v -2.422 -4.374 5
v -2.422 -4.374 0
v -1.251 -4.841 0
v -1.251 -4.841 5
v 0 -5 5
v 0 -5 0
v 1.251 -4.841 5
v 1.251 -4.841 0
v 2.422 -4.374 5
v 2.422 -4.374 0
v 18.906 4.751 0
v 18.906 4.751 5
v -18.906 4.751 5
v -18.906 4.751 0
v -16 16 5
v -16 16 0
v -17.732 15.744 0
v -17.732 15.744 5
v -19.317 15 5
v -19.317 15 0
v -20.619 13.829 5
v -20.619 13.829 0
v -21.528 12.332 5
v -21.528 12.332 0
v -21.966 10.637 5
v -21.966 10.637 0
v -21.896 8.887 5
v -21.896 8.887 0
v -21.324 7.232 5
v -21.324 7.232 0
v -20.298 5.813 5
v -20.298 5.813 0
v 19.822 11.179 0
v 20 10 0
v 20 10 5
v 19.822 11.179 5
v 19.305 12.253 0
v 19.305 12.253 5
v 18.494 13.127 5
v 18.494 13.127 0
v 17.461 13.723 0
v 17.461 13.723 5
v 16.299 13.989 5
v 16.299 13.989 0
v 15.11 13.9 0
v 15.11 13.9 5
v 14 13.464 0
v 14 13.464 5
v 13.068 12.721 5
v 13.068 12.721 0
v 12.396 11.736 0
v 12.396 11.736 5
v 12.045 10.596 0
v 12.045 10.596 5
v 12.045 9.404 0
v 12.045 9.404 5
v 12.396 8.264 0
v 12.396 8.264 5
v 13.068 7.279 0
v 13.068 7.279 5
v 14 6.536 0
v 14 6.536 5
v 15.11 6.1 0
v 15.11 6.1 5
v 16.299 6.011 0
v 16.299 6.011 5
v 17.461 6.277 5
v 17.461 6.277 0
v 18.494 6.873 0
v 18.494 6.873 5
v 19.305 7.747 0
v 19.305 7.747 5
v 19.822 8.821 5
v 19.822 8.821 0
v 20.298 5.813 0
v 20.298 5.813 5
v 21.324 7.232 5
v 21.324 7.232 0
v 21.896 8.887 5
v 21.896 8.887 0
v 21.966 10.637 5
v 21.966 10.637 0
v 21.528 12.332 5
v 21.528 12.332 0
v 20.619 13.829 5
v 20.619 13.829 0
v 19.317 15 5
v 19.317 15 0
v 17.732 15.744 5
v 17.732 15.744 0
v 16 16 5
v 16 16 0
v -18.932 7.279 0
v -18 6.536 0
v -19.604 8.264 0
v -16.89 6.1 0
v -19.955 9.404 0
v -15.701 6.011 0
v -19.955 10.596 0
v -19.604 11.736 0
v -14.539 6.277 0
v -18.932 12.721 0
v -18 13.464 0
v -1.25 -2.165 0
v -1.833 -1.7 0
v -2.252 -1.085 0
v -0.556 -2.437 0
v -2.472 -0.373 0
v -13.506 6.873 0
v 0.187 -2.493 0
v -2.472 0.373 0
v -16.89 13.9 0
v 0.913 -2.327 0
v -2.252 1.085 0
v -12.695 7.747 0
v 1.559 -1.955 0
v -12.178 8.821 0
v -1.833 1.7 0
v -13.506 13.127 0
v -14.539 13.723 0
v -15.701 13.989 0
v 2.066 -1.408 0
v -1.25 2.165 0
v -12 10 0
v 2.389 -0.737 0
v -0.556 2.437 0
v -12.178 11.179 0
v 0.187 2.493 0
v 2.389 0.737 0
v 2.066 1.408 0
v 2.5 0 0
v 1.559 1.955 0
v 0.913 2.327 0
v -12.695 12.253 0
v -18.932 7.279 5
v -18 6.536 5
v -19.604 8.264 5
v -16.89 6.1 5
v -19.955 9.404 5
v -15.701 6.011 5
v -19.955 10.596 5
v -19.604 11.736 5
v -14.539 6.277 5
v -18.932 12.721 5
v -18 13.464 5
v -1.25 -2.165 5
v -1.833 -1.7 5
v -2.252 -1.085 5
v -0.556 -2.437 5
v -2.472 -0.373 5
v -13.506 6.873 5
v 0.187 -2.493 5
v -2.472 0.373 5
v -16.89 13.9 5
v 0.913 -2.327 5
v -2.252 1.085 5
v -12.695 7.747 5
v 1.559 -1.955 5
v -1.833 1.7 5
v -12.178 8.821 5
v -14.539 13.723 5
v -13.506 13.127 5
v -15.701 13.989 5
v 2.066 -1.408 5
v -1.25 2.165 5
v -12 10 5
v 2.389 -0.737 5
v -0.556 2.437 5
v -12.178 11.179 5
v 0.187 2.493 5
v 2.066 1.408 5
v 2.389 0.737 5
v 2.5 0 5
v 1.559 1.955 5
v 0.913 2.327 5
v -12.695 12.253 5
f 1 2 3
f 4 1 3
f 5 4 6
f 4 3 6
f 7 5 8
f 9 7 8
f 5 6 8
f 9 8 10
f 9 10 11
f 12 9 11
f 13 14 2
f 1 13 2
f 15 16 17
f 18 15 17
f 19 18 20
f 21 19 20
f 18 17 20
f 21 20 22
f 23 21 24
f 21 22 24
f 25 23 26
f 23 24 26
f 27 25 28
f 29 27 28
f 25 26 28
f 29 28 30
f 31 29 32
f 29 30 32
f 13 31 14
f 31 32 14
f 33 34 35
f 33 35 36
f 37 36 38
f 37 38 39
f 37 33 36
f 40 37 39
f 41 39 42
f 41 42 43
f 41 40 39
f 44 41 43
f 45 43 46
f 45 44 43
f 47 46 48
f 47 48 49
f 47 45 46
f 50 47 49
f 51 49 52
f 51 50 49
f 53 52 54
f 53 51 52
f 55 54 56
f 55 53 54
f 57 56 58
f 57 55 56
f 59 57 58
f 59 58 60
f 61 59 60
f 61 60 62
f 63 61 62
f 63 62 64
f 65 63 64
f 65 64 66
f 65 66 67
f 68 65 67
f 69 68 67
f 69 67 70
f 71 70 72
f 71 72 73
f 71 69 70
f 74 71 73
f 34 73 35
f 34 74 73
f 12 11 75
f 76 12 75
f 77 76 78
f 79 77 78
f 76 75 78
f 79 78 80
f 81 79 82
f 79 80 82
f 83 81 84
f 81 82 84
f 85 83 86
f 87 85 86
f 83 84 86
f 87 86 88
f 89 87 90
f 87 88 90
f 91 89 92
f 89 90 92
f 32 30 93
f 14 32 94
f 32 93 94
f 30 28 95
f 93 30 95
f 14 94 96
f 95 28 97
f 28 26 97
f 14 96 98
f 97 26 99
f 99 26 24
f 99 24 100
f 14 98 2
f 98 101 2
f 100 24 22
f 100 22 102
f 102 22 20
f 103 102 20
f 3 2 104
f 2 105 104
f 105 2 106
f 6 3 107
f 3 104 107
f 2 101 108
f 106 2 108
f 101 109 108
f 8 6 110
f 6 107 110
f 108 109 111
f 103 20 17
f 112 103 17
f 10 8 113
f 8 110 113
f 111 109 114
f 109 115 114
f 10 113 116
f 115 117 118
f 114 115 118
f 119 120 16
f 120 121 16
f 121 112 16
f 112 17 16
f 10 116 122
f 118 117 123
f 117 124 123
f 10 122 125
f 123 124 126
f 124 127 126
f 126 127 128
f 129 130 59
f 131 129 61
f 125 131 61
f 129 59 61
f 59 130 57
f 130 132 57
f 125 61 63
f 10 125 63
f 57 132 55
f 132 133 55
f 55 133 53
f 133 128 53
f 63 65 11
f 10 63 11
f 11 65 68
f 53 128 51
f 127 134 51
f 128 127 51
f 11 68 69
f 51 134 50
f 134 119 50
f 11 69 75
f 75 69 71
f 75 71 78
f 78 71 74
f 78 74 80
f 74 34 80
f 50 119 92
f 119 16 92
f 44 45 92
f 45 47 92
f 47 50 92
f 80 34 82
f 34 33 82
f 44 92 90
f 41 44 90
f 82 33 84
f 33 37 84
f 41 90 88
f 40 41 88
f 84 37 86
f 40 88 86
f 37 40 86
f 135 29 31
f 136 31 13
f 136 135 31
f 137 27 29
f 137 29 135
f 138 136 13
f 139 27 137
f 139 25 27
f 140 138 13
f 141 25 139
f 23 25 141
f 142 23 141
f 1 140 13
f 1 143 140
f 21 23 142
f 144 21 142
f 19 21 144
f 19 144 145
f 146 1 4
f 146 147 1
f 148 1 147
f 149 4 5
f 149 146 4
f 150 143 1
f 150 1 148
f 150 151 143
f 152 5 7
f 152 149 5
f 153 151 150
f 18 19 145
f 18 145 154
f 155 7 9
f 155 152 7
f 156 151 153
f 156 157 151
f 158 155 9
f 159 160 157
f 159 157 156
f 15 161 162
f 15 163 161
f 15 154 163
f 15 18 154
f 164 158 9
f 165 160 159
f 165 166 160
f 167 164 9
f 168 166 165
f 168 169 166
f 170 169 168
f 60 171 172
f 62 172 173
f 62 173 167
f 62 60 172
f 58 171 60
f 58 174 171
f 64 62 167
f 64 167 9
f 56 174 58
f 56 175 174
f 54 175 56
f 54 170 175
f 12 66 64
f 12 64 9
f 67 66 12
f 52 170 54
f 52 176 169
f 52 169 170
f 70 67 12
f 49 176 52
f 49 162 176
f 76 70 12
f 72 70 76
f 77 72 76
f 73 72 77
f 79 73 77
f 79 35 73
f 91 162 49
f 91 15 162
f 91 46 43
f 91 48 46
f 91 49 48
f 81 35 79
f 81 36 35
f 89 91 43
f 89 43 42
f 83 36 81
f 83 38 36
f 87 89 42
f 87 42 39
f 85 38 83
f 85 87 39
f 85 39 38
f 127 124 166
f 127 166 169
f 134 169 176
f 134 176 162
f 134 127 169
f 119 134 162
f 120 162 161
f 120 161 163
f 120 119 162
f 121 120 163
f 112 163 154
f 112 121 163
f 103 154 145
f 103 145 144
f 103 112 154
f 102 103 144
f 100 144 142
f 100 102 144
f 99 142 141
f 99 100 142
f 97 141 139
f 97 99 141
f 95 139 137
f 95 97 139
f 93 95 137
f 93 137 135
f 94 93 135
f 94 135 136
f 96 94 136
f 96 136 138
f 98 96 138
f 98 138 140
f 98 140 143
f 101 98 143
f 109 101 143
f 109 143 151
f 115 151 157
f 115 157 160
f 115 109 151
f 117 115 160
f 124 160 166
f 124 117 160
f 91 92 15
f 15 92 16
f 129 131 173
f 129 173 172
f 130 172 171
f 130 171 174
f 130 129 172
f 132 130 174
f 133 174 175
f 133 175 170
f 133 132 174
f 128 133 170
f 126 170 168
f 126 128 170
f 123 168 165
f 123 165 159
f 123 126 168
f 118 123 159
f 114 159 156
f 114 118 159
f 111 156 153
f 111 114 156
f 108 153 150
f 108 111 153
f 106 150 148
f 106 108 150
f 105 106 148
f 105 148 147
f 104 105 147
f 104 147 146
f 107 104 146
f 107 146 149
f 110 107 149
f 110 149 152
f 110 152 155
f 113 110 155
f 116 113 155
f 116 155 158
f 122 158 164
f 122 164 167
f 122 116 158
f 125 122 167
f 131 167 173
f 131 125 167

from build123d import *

# Parameters (mm, degrees)
SKETCH1_R           = 2.5
SKETCH1_R_2         = 4
BOSS_EXTRUDE1_DEPTH = 5


with BuildPart() as part:
    # Sketch1 → Boss-Extrude1 (new body)
    with BuildSketch(Plane.XY):
        with BuildLine():
            Line((16, 16), (-16, 16))
            ThreePointArc((-16, 16), (-21.809314436, 11.5006218), (-18.905861295, 4.750621929))
            Line((-18.905861295, 4.750621929), (-2.421551079, -4.374481726))
            ThreePointArc((-2.421551079, -4.374481726), (0, -5), (2.421551079, -4.374481726))
            Line((2.421551079, -4.374481726), (18.905861295, 4.750621929))
            ThreePointArc((18.905861295, 4.750621929), (21.809314436, 11.5006218), (16, 16))
        make_face()
        Circle(SKETCH1_R, mode=Mode.SUBTRACT)
        with Locations((-16, 10)):
            Circle(SKETCH1_R_2, mode=Mode.SUBTRACT)
        with Locations((16, 10)):
            Circle(SKETCH1_R_2, mode=Mode.SUBTRACT)
    extrude(amount=BOSS_EXTRUDE1_DEPTH)


solid = part.part
